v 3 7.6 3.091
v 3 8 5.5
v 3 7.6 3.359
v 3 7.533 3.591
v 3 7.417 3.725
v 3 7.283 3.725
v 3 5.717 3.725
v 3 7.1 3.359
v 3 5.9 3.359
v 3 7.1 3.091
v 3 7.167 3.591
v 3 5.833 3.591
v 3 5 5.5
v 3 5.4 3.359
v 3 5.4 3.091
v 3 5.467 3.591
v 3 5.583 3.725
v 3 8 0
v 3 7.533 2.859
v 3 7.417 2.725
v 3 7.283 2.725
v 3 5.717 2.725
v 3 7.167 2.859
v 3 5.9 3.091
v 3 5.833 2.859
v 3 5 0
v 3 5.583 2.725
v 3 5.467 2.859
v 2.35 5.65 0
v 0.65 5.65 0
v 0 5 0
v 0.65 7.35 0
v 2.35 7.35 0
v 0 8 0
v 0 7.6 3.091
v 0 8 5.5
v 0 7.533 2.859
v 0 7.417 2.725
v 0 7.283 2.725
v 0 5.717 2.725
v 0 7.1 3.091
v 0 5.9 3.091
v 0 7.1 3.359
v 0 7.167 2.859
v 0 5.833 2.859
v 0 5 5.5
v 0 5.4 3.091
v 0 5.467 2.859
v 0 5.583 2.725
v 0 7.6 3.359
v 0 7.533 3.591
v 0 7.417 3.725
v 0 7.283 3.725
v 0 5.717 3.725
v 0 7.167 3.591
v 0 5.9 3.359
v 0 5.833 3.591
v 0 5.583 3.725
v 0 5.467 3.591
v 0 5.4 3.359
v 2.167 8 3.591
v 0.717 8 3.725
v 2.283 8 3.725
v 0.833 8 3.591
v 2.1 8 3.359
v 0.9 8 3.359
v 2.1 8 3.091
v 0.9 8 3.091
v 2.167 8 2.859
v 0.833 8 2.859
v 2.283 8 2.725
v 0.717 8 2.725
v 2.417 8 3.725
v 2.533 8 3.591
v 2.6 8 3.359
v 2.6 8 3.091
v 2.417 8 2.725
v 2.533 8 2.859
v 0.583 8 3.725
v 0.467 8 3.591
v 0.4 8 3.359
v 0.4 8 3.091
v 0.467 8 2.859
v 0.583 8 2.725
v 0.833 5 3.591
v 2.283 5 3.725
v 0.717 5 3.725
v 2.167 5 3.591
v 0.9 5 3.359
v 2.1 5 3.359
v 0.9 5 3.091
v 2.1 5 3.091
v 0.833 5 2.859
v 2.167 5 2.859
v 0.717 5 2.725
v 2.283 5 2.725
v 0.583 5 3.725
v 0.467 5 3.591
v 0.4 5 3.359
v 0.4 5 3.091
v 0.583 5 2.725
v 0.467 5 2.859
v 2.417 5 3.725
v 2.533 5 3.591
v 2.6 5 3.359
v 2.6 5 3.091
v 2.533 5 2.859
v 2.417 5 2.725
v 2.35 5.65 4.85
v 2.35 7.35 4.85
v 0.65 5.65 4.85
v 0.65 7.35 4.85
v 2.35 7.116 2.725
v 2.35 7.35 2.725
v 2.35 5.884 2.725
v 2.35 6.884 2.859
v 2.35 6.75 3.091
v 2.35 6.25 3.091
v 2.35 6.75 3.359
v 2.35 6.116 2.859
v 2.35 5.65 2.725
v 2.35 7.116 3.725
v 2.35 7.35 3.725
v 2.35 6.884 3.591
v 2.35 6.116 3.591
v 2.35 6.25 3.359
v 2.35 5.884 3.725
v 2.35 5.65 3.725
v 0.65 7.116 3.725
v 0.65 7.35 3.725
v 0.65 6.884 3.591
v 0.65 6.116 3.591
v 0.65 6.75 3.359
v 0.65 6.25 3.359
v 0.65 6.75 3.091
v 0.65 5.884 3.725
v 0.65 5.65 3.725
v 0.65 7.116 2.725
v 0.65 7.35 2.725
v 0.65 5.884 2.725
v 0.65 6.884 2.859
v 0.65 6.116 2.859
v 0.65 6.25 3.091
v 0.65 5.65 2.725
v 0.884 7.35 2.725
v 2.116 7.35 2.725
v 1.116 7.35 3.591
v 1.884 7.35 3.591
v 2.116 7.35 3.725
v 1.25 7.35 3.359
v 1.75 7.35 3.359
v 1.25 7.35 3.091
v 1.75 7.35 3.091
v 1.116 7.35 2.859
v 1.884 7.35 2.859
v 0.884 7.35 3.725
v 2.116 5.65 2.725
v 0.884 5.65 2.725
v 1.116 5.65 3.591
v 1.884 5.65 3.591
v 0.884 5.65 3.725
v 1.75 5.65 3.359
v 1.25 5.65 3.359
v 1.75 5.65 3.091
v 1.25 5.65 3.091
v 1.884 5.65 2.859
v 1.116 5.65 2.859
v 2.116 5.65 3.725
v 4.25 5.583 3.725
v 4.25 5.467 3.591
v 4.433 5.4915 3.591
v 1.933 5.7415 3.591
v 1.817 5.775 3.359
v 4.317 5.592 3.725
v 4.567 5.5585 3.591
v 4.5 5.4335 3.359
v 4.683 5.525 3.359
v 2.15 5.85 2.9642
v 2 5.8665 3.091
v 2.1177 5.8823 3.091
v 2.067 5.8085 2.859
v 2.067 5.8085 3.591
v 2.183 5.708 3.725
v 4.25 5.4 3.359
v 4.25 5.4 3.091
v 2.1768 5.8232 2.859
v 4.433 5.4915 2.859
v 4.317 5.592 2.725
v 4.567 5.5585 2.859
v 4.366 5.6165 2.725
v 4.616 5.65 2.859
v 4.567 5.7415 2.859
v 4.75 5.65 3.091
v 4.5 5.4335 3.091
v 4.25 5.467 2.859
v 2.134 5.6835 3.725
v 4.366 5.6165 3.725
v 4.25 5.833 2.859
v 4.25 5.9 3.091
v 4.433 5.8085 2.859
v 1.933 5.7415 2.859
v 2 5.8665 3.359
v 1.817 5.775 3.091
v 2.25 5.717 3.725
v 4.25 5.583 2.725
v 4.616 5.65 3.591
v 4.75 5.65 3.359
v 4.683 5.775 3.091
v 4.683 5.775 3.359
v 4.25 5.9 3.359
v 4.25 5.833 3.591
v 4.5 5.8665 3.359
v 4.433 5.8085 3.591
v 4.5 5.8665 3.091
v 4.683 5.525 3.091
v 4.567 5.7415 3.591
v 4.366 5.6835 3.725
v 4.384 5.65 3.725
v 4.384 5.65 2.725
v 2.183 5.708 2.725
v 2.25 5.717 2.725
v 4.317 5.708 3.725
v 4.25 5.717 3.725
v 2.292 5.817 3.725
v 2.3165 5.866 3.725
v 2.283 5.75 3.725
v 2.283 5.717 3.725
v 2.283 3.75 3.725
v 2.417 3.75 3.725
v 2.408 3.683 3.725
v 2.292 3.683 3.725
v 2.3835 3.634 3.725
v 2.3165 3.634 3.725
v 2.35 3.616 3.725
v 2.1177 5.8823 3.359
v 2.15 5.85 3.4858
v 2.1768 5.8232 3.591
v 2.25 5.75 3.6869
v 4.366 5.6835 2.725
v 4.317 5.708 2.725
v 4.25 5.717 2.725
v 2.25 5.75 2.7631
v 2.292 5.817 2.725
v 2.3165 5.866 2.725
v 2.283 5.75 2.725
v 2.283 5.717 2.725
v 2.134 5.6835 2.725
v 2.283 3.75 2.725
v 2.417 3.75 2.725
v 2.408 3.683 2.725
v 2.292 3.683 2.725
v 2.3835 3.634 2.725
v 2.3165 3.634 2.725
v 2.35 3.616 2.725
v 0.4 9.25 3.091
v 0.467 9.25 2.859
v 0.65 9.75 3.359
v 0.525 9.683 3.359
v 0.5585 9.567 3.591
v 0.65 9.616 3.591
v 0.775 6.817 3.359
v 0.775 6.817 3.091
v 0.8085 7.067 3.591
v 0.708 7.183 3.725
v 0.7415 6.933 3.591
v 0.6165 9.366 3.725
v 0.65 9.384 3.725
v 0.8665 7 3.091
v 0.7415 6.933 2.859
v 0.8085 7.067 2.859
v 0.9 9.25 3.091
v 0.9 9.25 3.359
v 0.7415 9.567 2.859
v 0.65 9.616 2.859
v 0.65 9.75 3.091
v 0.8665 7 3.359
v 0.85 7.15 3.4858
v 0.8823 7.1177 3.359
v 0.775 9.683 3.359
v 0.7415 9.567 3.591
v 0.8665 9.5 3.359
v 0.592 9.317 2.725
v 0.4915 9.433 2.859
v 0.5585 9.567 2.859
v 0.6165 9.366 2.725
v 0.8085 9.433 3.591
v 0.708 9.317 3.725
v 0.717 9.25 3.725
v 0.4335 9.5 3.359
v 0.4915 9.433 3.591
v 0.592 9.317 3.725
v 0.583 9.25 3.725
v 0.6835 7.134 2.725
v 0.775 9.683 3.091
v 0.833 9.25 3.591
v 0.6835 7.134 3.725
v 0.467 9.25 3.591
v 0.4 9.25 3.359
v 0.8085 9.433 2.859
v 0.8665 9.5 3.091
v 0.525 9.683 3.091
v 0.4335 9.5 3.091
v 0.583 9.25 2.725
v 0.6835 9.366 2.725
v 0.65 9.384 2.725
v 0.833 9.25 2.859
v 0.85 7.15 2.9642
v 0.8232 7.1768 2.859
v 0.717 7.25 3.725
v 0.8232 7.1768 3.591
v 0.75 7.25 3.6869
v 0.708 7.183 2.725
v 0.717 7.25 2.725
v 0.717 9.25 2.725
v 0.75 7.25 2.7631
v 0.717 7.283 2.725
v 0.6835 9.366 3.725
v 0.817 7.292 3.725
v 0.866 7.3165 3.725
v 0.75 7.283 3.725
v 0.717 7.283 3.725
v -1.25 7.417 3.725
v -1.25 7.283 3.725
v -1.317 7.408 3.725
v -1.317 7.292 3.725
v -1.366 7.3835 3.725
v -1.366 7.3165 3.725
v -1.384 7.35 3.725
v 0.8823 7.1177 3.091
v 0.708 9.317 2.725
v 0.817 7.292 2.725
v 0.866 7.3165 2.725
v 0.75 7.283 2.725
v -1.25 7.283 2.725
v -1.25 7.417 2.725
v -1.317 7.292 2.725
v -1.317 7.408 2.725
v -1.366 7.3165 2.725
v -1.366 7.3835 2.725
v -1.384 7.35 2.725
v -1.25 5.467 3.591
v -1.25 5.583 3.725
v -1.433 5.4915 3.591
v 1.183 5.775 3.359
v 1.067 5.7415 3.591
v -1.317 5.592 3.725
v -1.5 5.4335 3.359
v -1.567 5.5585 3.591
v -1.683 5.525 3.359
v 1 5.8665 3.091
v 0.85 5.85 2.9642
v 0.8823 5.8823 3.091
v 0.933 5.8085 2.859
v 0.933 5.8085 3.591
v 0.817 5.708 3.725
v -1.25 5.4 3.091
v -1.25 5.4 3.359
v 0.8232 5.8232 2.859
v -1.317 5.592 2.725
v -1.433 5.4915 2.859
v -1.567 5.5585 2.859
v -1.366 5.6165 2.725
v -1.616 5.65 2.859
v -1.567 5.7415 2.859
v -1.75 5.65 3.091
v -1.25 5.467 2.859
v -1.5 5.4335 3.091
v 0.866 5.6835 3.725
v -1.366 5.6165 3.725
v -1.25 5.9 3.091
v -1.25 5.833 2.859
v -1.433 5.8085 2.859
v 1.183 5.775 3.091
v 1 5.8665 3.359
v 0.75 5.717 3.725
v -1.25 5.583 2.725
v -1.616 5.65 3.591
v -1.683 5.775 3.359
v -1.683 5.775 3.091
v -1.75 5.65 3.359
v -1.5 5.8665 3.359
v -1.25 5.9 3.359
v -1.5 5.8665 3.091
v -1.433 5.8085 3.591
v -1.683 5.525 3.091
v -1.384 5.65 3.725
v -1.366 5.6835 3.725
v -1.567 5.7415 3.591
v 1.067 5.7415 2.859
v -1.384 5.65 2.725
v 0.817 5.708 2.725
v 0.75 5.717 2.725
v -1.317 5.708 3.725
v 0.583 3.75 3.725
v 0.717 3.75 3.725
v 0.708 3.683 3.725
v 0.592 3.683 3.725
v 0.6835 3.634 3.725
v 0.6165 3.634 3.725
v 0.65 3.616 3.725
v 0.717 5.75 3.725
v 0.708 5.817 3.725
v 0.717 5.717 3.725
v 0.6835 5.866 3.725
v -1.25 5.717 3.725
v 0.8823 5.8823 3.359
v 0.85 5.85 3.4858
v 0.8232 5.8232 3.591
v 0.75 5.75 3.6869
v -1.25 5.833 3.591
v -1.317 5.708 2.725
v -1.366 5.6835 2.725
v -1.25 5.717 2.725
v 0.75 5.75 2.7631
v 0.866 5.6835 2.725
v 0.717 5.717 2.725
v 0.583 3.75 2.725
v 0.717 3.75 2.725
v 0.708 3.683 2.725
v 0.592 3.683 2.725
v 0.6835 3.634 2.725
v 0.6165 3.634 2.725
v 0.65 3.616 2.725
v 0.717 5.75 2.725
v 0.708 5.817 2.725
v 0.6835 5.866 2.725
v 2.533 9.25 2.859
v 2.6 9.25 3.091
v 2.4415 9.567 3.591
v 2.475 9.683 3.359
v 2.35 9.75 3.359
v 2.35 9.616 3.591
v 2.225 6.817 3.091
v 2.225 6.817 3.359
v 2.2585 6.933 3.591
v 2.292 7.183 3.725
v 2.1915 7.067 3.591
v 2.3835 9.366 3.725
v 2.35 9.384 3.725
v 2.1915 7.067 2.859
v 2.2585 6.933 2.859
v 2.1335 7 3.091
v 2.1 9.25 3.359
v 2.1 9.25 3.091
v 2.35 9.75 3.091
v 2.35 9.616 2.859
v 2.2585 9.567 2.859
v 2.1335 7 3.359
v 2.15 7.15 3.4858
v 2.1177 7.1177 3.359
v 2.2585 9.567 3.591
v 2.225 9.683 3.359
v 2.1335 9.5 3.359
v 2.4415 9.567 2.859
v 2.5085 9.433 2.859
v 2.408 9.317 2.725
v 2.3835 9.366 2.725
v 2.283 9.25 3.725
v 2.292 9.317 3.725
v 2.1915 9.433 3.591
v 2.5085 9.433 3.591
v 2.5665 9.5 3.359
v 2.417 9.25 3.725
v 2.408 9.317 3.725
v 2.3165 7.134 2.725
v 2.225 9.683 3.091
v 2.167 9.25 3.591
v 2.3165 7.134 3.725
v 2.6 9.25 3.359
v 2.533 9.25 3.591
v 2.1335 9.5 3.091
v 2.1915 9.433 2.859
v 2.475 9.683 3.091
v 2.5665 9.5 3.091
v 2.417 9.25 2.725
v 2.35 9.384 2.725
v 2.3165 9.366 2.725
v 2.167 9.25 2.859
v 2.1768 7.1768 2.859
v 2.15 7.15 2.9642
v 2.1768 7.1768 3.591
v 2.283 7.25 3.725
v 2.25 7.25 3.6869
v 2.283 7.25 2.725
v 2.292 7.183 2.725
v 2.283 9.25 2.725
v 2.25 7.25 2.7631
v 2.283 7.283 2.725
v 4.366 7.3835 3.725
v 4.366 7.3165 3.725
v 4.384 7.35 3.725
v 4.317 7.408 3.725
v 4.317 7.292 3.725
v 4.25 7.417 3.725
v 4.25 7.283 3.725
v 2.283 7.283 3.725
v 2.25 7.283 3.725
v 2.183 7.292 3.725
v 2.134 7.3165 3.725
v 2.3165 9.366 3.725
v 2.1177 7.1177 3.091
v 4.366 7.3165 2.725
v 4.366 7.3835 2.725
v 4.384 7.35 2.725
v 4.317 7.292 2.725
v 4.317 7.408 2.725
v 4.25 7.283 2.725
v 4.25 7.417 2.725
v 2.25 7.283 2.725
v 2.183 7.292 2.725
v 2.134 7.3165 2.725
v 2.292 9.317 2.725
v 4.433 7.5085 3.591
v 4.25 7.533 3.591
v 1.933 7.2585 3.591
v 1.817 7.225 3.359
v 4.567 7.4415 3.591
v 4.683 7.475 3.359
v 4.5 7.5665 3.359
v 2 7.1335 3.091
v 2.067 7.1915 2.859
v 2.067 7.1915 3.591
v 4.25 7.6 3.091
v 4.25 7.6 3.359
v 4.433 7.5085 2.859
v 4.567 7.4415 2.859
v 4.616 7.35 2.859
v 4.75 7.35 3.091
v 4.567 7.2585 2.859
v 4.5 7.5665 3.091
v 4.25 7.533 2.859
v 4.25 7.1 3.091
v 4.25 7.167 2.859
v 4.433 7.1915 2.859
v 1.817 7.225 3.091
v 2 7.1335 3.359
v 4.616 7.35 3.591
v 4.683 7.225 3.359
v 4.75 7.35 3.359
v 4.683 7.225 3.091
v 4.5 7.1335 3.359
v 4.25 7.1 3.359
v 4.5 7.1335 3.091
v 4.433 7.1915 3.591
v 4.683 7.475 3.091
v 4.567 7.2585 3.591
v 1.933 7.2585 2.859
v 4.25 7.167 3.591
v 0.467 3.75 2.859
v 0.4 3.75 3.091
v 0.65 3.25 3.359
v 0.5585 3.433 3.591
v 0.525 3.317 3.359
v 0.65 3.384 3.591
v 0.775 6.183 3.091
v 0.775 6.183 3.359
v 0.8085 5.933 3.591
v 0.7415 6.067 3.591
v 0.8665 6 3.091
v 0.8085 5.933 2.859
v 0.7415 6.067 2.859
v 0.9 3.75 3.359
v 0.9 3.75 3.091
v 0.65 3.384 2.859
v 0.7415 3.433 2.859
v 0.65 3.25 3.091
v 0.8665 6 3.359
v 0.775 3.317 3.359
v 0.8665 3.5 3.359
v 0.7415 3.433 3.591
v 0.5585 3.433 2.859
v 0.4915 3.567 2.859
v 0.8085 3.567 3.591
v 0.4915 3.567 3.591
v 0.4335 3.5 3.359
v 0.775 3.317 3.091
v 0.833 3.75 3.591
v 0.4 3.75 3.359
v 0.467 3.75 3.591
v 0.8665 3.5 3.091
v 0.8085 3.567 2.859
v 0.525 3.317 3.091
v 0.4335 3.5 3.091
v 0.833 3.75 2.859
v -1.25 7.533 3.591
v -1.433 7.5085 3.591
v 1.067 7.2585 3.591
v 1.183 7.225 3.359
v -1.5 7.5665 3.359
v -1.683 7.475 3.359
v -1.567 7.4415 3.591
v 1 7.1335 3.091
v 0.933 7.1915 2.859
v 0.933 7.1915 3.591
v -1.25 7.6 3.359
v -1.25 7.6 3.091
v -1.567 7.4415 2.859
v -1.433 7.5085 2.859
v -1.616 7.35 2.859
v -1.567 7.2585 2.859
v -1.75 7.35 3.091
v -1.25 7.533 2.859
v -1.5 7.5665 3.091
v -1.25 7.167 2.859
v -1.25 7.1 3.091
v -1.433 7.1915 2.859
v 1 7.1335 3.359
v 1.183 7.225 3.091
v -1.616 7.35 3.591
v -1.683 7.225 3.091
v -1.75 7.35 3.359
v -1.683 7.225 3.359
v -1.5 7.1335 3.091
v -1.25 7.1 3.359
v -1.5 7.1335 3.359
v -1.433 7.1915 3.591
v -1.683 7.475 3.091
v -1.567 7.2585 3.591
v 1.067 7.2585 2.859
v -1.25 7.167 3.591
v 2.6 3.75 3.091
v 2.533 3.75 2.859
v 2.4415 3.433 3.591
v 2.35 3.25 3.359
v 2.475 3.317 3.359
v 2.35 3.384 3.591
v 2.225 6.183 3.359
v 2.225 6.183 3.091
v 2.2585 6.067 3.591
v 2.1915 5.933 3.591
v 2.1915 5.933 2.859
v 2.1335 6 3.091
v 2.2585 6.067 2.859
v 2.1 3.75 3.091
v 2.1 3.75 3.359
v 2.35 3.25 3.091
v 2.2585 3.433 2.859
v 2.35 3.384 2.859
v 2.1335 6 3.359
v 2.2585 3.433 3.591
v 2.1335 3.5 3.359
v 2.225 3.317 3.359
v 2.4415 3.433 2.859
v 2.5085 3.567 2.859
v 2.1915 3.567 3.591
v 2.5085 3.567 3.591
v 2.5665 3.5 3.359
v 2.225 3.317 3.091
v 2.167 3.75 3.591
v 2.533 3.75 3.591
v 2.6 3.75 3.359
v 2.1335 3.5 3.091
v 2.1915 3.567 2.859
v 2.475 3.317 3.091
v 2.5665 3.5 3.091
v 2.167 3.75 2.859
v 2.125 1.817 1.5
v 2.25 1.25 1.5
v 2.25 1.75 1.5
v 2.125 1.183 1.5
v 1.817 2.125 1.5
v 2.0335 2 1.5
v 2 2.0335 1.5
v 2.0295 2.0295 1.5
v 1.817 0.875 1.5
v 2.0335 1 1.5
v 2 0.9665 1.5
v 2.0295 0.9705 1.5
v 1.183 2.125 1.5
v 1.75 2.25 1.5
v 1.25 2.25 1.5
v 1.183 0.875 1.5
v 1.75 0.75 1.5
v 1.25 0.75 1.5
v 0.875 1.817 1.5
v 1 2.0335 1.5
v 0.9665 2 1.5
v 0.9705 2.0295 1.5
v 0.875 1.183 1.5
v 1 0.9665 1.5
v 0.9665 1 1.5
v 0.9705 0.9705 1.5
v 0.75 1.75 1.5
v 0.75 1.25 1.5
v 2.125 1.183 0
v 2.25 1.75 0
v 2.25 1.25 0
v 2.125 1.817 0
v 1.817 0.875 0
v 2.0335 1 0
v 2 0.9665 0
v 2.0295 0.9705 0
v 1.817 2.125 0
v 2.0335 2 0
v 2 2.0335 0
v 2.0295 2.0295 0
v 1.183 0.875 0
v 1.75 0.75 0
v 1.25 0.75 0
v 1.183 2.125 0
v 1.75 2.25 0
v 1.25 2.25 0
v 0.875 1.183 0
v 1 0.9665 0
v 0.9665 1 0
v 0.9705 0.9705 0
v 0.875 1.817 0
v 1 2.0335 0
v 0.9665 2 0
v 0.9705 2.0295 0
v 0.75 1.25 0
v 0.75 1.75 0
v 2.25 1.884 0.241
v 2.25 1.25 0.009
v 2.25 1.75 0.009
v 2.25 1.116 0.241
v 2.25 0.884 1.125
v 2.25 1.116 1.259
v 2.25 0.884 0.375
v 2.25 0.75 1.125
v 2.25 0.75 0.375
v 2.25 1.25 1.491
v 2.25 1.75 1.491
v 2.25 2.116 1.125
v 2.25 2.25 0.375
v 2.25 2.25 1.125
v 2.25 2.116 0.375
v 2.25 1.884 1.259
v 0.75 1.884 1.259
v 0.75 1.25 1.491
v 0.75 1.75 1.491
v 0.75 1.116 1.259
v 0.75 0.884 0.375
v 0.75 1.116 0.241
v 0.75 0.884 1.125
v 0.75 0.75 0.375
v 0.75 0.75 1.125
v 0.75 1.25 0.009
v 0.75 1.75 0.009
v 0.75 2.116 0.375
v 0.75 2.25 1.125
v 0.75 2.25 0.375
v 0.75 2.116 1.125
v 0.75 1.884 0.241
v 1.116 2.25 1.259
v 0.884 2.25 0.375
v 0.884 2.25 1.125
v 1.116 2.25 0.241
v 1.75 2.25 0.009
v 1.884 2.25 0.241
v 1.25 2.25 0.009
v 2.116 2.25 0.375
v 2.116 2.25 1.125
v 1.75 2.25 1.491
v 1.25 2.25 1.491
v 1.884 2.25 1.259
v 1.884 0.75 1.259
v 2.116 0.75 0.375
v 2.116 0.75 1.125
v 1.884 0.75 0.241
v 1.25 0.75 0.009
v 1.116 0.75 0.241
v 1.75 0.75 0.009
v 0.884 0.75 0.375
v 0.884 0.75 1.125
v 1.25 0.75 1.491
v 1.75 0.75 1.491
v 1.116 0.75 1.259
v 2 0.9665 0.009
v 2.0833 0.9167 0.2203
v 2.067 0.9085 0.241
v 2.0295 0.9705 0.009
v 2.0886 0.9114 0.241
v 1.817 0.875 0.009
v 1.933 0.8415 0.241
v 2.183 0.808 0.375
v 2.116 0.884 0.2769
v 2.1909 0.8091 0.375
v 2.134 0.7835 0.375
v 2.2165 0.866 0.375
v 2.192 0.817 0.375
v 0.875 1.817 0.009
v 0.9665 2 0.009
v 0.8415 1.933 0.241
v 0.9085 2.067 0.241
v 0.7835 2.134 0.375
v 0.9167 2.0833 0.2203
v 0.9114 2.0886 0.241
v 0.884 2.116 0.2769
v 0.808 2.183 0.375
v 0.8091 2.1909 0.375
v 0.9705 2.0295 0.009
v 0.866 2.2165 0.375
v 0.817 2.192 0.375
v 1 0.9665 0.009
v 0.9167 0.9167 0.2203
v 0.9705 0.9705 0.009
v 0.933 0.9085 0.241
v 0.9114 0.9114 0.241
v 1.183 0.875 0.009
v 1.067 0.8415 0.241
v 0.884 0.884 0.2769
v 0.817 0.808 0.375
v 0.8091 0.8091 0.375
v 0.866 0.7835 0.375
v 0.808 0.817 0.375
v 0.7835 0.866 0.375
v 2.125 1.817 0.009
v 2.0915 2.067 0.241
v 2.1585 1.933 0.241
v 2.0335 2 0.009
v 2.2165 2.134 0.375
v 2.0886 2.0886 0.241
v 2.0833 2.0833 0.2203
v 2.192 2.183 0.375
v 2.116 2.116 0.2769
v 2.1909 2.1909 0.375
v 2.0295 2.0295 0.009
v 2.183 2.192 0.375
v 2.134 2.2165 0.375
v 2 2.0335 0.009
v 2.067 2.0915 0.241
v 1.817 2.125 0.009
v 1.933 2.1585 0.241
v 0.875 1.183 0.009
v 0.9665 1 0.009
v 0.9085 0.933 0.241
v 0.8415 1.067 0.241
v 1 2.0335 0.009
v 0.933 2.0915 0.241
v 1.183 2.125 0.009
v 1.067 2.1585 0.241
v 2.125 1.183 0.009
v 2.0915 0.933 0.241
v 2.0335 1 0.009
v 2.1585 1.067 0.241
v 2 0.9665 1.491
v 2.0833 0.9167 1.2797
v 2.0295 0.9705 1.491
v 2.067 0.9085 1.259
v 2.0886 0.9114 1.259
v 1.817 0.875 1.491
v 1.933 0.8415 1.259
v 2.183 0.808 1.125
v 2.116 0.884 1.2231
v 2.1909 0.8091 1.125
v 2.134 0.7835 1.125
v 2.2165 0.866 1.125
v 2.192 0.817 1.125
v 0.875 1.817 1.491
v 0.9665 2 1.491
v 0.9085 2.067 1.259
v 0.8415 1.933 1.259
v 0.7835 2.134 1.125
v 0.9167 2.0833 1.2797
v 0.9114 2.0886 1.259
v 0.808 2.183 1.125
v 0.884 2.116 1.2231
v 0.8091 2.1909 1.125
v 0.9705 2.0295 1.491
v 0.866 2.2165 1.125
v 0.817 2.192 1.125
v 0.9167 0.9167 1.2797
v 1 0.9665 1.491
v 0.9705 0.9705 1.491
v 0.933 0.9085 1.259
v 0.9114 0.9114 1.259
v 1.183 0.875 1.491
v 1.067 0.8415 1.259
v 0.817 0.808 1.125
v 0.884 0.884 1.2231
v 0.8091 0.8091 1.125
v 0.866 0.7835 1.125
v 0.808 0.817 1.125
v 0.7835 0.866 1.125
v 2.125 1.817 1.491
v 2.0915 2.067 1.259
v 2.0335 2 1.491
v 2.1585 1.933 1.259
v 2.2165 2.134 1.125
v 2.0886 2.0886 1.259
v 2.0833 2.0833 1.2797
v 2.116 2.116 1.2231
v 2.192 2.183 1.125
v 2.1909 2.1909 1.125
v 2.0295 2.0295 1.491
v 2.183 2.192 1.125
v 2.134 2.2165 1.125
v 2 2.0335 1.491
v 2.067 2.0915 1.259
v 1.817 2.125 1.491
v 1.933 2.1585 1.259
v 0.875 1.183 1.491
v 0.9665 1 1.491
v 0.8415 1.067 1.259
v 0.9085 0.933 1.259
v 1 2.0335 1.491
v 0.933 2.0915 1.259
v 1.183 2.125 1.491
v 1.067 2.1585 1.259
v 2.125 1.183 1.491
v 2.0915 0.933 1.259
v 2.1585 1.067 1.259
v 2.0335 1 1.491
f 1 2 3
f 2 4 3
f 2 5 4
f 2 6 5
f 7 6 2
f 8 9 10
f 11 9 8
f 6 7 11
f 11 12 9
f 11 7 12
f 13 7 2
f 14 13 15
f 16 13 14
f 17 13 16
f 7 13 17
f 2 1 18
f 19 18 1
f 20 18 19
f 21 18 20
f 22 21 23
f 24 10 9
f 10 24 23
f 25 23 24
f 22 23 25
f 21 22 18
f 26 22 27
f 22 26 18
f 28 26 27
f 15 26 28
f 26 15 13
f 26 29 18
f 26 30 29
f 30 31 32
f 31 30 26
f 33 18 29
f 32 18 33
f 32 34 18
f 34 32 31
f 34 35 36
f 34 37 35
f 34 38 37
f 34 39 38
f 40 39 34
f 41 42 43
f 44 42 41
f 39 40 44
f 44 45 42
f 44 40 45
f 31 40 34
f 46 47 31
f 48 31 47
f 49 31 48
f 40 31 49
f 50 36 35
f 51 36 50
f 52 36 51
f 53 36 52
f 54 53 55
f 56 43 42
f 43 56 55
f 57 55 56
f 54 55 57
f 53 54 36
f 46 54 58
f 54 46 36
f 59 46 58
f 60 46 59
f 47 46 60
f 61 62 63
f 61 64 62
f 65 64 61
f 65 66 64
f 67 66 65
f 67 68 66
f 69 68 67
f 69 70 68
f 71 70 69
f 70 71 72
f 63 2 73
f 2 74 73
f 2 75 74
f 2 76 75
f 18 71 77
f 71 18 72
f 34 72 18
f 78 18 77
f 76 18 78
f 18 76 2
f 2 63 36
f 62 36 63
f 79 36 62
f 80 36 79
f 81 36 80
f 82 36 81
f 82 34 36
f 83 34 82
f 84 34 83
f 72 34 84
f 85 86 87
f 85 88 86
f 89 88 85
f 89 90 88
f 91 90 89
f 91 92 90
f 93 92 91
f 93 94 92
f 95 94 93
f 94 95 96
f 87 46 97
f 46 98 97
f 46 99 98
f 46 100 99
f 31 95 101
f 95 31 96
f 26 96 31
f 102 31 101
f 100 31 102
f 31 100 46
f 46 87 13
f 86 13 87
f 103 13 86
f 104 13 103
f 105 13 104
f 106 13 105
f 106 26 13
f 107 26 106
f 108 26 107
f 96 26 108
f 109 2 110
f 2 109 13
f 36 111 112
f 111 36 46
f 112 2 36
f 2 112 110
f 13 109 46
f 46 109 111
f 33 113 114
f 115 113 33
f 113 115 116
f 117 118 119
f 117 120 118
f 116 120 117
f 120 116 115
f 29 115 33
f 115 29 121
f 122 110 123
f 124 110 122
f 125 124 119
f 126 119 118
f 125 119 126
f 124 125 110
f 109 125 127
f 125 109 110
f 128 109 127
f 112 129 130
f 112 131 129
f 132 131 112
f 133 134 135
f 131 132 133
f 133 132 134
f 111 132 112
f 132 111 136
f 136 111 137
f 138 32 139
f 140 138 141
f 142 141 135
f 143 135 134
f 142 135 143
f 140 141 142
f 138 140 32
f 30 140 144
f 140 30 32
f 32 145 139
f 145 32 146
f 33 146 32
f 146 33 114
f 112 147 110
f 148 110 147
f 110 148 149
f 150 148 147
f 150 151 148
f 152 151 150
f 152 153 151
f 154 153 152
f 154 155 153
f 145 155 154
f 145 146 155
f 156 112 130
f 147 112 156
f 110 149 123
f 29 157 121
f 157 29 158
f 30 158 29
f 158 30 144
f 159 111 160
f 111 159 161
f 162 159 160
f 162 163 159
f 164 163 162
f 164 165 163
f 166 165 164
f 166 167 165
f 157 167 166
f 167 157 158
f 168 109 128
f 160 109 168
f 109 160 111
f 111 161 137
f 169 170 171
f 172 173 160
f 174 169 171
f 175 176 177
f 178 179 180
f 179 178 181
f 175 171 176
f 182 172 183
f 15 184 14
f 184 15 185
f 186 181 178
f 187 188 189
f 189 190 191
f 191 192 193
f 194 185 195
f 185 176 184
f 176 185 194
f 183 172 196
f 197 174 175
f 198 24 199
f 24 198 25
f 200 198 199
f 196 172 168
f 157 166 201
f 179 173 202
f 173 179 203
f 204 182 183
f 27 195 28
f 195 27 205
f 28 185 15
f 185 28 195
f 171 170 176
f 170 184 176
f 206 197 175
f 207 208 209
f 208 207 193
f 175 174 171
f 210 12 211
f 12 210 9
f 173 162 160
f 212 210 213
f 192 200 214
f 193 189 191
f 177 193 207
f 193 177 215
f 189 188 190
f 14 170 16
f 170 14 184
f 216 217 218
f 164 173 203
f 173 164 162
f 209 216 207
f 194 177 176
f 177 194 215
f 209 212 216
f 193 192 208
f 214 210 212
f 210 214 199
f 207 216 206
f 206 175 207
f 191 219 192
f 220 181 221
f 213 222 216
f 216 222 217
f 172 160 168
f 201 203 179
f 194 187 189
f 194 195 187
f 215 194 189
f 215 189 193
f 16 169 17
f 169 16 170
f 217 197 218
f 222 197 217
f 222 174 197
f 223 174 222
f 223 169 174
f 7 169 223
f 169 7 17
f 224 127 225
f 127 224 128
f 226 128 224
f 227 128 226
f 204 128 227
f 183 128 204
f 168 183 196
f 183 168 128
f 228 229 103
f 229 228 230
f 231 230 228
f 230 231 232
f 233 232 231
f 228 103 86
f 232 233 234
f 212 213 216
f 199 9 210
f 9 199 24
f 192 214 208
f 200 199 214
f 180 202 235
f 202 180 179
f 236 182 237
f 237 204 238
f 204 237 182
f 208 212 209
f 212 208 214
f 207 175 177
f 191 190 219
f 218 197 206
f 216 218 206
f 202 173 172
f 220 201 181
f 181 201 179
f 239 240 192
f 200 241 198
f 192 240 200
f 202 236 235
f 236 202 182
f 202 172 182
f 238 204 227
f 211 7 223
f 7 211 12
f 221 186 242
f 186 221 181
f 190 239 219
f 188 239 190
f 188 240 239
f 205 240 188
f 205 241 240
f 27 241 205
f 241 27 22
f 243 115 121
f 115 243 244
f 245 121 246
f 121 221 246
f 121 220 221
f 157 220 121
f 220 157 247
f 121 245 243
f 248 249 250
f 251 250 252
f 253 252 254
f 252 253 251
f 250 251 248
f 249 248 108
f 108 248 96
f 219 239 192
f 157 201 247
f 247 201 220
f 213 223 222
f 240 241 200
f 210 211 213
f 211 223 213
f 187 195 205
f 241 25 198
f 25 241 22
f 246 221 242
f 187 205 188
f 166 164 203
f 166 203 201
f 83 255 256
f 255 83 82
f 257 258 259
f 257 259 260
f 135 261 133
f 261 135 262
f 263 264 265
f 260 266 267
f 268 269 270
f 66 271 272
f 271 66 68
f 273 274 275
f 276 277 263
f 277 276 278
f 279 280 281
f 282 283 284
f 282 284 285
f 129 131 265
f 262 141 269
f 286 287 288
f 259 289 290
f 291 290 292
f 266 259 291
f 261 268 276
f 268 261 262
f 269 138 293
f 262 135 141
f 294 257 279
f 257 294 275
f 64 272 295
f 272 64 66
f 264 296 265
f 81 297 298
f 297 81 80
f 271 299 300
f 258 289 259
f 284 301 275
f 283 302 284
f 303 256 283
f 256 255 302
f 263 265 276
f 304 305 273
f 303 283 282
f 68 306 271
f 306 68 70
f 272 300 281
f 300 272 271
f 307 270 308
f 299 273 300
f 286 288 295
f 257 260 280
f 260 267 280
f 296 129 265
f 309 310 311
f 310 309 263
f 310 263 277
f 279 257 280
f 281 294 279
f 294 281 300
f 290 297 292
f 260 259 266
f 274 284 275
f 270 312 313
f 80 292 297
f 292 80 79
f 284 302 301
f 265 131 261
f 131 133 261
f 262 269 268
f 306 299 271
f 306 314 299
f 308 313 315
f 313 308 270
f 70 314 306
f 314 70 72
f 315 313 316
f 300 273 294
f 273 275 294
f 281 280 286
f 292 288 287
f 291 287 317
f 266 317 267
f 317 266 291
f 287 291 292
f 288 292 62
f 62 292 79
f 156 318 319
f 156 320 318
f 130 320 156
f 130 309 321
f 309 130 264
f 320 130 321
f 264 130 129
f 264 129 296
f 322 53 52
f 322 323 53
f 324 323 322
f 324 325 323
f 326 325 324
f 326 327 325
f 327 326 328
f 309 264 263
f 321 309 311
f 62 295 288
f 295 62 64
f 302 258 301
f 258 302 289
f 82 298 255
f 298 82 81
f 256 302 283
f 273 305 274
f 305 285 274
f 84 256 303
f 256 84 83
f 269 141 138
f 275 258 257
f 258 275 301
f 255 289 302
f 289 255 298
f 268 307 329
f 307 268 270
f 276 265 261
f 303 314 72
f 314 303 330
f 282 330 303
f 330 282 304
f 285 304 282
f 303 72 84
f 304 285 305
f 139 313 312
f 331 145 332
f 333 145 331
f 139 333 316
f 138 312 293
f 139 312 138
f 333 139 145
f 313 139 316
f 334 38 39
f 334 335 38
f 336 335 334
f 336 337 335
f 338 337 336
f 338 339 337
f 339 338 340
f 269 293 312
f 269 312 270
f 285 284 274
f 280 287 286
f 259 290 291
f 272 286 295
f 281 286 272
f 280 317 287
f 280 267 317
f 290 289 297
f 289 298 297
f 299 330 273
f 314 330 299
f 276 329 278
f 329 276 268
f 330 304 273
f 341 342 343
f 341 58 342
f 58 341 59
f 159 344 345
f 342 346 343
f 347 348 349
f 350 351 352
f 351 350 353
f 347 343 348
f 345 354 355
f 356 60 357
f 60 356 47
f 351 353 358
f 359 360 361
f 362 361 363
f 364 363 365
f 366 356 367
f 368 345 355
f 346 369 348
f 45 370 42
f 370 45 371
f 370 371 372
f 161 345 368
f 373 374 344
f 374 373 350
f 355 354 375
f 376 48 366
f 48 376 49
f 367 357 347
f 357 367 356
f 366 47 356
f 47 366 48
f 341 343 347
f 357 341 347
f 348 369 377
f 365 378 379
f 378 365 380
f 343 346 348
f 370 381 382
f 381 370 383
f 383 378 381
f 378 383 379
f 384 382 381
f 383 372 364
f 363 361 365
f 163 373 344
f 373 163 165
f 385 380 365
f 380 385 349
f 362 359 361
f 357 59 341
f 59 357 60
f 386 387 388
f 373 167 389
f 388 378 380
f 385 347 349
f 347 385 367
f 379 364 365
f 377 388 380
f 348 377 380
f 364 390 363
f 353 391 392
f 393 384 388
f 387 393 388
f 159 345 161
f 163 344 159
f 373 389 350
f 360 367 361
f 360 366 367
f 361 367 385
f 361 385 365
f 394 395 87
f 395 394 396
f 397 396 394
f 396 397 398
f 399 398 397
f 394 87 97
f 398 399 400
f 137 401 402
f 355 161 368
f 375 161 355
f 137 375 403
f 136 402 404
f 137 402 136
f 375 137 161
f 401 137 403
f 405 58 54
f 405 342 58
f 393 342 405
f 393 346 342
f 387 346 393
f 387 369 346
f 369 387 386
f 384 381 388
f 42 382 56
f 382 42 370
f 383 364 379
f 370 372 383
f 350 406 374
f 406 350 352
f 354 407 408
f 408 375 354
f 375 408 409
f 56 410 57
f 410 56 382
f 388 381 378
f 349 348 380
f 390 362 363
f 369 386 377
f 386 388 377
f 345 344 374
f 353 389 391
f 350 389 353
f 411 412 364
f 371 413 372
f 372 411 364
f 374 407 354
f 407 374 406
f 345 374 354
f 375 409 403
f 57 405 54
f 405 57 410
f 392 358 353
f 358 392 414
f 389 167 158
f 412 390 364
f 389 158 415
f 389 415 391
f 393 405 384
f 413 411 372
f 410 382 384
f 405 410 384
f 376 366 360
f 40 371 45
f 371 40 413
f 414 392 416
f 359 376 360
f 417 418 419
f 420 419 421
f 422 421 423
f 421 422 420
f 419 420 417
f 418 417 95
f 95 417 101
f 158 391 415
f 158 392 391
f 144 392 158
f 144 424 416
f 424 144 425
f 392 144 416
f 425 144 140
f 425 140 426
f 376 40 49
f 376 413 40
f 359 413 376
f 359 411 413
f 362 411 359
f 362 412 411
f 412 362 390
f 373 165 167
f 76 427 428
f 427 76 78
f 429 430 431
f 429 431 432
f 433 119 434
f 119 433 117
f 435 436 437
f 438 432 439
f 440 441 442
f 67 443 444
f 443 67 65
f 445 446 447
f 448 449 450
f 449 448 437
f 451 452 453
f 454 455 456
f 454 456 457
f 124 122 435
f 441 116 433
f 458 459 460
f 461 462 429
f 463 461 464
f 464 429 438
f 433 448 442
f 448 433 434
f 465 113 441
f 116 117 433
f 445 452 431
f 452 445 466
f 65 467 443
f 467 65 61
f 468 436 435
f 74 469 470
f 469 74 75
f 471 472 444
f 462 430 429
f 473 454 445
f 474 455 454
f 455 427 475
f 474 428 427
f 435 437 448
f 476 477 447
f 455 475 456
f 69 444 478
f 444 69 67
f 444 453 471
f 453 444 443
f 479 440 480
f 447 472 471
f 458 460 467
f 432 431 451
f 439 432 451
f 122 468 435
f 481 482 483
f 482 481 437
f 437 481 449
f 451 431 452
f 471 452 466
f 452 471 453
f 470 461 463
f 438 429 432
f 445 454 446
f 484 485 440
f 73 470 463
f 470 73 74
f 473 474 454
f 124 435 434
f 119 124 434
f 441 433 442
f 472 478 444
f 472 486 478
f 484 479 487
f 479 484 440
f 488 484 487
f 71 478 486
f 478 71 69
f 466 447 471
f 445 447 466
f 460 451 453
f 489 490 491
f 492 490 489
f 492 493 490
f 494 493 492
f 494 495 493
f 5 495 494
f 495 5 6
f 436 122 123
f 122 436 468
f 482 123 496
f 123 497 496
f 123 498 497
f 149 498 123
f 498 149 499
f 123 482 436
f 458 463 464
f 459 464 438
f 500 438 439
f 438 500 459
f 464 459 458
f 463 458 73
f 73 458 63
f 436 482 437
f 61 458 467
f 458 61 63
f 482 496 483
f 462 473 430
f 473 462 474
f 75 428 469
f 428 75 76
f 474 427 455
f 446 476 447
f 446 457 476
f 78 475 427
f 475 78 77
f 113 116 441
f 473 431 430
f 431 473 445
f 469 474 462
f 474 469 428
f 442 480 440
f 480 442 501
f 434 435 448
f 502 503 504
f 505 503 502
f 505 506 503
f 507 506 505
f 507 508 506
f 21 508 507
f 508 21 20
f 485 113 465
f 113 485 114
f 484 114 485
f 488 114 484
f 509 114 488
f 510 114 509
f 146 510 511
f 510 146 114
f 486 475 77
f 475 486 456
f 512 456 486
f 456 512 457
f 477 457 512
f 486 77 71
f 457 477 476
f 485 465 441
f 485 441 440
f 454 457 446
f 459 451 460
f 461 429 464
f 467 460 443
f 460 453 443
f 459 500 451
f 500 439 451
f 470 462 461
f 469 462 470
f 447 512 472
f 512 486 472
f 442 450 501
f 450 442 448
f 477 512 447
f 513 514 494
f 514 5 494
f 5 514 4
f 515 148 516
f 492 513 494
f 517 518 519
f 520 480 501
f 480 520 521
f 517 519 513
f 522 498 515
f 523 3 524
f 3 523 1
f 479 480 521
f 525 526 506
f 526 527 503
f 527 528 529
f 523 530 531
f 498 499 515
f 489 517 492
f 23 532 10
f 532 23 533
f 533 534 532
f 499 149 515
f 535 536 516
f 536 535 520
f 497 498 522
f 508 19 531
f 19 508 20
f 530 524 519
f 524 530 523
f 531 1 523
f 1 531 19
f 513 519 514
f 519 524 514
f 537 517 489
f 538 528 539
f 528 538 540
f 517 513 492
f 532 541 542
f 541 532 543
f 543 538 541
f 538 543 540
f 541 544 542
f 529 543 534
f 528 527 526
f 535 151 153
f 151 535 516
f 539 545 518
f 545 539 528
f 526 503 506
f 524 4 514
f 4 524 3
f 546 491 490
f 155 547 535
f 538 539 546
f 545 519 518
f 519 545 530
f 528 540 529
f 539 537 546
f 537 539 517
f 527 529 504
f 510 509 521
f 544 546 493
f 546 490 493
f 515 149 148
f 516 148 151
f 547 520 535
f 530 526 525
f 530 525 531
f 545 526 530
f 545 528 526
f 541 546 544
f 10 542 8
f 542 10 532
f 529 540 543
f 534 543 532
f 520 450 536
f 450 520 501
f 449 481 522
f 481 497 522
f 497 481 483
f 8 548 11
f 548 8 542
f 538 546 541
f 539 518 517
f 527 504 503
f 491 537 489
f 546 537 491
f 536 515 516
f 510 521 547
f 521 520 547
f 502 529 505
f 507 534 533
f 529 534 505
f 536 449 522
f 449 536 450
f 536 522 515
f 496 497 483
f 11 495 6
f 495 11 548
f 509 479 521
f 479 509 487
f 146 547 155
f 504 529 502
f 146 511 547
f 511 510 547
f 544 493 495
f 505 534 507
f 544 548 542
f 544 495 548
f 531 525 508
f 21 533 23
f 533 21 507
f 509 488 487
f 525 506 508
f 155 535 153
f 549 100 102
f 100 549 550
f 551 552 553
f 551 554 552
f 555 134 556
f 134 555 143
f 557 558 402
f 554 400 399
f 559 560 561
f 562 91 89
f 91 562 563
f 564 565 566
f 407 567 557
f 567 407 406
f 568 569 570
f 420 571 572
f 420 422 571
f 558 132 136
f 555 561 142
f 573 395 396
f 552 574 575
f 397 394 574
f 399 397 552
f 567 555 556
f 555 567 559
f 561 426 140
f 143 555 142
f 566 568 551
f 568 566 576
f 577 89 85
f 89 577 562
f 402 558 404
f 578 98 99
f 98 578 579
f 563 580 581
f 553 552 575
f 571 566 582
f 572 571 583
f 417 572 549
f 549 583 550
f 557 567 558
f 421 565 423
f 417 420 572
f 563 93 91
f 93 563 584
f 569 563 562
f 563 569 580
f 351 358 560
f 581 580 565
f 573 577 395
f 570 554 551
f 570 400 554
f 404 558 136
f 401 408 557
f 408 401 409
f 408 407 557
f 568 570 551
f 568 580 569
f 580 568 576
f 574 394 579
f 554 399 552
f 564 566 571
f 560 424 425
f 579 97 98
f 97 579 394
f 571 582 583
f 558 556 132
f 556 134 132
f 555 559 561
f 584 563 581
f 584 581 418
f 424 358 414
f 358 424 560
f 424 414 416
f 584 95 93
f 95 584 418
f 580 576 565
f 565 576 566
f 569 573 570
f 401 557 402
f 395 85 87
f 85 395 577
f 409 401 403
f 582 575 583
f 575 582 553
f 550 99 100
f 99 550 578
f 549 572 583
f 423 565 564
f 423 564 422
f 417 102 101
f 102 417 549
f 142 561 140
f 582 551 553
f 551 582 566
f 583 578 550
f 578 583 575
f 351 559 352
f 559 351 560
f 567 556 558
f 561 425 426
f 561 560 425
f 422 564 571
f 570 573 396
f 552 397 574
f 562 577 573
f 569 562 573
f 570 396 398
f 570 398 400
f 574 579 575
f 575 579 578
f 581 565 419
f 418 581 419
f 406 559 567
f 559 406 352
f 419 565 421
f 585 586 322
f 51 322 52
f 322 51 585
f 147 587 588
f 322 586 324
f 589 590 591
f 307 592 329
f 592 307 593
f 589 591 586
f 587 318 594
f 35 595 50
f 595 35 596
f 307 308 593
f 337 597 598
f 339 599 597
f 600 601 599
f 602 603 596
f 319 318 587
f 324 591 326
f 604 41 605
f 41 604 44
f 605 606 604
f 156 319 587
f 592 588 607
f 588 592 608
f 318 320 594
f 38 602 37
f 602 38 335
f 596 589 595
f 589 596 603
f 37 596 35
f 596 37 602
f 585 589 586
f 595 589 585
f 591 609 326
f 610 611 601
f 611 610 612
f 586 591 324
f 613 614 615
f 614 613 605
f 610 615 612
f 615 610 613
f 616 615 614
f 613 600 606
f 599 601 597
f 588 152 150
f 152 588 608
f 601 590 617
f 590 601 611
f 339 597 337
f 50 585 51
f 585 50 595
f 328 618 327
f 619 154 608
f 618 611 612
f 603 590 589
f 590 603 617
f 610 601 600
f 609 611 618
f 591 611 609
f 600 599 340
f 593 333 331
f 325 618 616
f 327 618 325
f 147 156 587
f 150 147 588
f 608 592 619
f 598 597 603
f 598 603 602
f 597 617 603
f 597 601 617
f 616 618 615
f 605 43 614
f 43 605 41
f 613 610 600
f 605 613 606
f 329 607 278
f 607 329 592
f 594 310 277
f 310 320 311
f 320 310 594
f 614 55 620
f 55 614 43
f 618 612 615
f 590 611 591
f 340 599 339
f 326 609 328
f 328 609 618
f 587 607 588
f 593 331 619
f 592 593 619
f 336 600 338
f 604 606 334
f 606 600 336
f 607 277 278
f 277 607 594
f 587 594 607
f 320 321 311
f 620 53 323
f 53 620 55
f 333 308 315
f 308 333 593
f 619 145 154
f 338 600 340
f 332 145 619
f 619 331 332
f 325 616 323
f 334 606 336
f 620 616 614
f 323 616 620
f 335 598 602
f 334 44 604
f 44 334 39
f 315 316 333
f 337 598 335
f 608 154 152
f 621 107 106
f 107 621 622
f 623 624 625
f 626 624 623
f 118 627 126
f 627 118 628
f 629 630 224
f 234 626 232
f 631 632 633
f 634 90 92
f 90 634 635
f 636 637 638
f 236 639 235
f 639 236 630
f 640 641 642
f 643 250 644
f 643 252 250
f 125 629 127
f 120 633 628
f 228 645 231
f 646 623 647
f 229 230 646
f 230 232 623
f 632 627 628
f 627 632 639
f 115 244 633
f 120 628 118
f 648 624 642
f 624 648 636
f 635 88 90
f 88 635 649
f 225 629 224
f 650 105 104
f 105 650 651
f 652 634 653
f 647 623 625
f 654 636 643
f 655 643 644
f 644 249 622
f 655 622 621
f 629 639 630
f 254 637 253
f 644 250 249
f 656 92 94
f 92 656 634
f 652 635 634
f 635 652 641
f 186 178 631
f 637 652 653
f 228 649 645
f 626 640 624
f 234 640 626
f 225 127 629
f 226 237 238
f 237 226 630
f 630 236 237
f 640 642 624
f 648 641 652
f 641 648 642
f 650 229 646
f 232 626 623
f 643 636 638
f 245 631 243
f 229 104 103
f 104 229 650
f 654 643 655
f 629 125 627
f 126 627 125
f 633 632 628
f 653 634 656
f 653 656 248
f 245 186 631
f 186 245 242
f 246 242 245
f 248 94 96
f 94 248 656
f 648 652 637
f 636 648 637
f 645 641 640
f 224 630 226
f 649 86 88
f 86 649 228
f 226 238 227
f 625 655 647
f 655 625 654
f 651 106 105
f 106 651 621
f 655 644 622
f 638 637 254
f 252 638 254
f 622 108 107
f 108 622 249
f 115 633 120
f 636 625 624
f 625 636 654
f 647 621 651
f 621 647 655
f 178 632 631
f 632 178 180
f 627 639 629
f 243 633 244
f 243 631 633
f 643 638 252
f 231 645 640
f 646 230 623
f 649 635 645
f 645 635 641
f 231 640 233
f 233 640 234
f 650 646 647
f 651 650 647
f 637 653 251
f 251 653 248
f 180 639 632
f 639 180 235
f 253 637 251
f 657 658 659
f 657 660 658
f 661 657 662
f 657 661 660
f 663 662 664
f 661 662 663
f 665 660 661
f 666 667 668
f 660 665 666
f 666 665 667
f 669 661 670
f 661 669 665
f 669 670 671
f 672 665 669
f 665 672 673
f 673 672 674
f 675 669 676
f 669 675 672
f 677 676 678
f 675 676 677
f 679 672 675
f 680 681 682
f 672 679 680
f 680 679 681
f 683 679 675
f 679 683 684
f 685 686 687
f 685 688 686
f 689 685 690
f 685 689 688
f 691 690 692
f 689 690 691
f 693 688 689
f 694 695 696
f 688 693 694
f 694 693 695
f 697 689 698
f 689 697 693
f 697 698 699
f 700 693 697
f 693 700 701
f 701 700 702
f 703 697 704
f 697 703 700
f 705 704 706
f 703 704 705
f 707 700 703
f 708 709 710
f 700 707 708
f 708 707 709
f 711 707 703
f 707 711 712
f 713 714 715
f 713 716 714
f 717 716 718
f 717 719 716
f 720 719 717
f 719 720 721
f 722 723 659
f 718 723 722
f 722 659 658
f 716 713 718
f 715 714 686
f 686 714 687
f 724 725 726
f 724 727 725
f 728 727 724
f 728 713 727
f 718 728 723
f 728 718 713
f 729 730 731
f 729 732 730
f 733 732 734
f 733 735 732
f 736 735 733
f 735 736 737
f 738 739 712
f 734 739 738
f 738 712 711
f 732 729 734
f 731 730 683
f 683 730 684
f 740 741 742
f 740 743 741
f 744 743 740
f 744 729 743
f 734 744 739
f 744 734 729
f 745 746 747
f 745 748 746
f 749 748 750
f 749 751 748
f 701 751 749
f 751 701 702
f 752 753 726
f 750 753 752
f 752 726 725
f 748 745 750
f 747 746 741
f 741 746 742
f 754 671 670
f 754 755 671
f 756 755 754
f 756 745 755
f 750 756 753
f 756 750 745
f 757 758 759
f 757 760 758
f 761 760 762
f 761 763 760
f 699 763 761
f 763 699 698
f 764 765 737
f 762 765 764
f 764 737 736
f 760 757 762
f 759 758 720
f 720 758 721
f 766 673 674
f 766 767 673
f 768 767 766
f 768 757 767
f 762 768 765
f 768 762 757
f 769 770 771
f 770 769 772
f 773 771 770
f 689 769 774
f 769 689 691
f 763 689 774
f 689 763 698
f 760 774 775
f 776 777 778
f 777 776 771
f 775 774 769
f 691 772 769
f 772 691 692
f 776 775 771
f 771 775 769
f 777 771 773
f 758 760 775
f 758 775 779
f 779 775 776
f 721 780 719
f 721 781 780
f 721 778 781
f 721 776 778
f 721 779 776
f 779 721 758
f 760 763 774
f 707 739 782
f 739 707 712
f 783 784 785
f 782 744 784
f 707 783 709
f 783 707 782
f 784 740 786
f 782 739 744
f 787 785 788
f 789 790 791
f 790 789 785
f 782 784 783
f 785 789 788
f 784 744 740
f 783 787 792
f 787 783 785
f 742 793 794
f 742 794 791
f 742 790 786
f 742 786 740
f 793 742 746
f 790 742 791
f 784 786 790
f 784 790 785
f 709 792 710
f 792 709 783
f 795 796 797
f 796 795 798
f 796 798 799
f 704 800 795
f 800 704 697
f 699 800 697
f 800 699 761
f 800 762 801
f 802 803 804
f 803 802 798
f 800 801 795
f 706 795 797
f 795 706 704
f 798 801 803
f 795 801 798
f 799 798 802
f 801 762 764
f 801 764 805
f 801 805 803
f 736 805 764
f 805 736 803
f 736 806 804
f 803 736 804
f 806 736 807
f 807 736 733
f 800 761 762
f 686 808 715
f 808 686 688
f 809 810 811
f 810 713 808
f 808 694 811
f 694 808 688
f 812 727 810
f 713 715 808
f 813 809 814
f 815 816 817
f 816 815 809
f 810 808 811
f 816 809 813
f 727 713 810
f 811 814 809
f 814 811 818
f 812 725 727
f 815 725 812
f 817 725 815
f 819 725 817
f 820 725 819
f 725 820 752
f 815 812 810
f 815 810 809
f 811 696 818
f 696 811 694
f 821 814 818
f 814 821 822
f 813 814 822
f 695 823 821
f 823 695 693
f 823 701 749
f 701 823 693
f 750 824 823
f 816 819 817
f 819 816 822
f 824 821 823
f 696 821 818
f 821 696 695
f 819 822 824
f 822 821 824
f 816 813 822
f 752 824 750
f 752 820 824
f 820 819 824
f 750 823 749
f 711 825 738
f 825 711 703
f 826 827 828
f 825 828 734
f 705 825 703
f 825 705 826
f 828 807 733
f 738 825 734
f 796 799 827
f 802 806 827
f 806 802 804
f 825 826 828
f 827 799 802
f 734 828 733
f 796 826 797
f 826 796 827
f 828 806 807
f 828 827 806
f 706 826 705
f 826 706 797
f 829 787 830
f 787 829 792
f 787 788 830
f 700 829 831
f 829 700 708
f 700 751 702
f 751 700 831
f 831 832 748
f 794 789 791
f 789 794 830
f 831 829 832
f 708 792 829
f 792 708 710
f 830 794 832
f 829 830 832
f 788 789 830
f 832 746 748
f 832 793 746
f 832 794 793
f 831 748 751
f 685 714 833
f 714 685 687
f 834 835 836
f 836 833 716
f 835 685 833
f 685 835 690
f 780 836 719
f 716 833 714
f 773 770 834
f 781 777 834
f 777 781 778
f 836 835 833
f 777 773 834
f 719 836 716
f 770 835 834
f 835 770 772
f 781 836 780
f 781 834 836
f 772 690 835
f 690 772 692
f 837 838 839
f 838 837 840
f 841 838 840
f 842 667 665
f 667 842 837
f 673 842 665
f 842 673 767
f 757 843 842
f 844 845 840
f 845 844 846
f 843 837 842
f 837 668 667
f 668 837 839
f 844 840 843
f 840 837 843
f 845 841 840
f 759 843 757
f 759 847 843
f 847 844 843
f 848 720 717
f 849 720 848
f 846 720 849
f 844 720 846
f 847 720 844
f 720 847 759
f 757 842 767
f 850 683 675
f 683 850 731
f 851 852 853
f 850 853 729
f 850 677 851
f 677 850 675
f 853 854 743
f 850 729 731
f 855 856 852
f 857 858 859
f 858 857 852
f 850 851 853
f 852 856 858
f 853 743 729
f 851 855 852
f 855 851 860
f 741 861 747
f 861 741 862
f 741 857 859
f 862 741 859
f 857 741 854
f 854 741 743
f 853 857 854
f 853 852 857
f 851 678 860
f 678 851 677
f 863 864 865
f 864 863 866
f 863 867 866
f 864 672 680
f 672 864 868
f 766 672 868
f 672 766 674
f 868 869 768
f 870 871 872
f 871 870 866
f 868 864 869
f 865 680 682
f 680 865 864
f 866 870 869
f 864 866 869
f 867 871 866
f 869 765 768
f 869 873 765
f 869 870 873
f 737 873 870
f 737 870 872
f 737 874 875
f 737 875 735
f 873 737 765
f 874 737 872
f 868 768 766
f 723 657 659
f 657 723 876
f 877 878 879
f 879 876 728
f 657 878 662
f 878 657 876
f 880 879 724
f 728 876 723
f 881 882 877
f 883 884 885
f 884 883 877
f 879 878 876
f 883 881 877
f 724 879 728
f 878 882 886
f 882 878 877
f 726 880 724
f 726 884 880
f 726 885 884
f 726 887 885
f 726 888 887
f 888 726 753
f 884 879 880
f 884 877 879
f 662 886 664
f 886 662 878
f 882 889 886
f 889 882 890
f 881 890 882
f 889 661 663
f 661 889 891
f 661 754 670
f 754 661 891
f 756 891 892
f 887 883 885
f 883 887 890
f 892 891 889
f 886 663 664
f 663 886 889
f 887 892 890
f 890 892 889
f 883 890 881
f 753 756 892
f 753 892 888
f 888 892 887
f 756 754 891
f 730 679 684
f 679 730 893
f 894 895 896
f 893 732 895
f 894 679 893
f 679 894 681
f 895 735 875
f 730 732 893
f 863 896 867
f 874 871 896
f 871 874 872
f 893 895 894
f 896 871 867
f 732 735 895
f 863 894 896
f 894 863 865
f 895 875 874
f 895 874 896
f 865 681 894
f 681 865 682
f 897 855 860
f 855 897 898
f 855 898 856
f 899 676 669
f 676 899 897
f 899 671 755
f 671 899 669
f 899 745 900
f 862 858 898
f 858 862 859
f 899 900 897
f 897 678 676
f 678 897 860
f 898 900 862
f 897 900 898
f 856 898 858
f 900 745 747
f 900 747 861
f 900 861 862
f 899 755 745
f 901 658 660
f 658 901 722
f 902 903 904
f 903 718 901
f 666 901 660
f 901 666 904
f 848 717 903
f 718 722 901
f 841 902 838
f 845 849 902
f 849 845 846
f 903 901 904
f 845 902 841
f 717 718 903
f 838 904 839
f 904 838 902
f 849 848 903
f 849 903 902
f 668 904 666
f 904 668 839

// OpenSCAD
// BGSD
include <../lib/boardgame_insert_toolkit_lib.4.scad>;
data = [
    // Source STL: Solo.stl
    // STL bbox min [10, -62, 0] max [47, 68, 56] size [37, 130, 56]
    // Detected compartments: 2; wall thickness: 1.5mm
    // Estimated bottom thickness: 0.8mm
    // Inferred side cutouts: right (medium)
    // Solo cavity 1: SQUARE shape (high, curved ratio 0)
    // Solo cavity 2: SQUARE shape (high, curved ratio 0.002)
    [ OBJECT_BOX,
        [ NAME, "Solo" ],
        [ BOX_SIZE_XYZ, [37, 130, 56] ],
        [ BOX_WALL_THICKNESS, 1.5 ],
        [ BOX_NO_LID_B, true ],
        [ BOX_FEATURE,
            [ NAME, "Solo cavity 1" ],
            [ FTR_COMPARTMENT_SIZE_XYZ, [34, 55.5, 54.5] ],
            [ FTR_NUM_COMPARTMENTS_XY, [1, 1] ],
            [ FTR_SHAPE, SQUARE ],
            [ POSITION_XY, [0, 0] ],
        ],
        [ BOX_FEATURE,
            [ NAME, "Solo cavity 2" ],
            [ FTR_COMPARTMENT_SIZE_XYZ, [34, 70, 54.5] ],
            [ FTR_NUM_COMPARTMENTS_XY, [1, 1] ],
            [ FTR_SHAPE, SQUARE ],
            [ POSITION_XY, [0, 57] ],
            [ FTR_CUTOUT_SIDES_4B, [false, false, false, true] ],
            [ FTR_CUTOUT_TYPE, INTERIOR ],
            [ FTR_CUTOUT_HEIGHT_PCT, 100 ],
            [ FTR_CUTOUT_DEPTH_PCT, 17.647 ],
            [ FTR_CUTOUT_WIDTH_PCT, 32.706 ],
        ],
    ],
];
Make(data);
